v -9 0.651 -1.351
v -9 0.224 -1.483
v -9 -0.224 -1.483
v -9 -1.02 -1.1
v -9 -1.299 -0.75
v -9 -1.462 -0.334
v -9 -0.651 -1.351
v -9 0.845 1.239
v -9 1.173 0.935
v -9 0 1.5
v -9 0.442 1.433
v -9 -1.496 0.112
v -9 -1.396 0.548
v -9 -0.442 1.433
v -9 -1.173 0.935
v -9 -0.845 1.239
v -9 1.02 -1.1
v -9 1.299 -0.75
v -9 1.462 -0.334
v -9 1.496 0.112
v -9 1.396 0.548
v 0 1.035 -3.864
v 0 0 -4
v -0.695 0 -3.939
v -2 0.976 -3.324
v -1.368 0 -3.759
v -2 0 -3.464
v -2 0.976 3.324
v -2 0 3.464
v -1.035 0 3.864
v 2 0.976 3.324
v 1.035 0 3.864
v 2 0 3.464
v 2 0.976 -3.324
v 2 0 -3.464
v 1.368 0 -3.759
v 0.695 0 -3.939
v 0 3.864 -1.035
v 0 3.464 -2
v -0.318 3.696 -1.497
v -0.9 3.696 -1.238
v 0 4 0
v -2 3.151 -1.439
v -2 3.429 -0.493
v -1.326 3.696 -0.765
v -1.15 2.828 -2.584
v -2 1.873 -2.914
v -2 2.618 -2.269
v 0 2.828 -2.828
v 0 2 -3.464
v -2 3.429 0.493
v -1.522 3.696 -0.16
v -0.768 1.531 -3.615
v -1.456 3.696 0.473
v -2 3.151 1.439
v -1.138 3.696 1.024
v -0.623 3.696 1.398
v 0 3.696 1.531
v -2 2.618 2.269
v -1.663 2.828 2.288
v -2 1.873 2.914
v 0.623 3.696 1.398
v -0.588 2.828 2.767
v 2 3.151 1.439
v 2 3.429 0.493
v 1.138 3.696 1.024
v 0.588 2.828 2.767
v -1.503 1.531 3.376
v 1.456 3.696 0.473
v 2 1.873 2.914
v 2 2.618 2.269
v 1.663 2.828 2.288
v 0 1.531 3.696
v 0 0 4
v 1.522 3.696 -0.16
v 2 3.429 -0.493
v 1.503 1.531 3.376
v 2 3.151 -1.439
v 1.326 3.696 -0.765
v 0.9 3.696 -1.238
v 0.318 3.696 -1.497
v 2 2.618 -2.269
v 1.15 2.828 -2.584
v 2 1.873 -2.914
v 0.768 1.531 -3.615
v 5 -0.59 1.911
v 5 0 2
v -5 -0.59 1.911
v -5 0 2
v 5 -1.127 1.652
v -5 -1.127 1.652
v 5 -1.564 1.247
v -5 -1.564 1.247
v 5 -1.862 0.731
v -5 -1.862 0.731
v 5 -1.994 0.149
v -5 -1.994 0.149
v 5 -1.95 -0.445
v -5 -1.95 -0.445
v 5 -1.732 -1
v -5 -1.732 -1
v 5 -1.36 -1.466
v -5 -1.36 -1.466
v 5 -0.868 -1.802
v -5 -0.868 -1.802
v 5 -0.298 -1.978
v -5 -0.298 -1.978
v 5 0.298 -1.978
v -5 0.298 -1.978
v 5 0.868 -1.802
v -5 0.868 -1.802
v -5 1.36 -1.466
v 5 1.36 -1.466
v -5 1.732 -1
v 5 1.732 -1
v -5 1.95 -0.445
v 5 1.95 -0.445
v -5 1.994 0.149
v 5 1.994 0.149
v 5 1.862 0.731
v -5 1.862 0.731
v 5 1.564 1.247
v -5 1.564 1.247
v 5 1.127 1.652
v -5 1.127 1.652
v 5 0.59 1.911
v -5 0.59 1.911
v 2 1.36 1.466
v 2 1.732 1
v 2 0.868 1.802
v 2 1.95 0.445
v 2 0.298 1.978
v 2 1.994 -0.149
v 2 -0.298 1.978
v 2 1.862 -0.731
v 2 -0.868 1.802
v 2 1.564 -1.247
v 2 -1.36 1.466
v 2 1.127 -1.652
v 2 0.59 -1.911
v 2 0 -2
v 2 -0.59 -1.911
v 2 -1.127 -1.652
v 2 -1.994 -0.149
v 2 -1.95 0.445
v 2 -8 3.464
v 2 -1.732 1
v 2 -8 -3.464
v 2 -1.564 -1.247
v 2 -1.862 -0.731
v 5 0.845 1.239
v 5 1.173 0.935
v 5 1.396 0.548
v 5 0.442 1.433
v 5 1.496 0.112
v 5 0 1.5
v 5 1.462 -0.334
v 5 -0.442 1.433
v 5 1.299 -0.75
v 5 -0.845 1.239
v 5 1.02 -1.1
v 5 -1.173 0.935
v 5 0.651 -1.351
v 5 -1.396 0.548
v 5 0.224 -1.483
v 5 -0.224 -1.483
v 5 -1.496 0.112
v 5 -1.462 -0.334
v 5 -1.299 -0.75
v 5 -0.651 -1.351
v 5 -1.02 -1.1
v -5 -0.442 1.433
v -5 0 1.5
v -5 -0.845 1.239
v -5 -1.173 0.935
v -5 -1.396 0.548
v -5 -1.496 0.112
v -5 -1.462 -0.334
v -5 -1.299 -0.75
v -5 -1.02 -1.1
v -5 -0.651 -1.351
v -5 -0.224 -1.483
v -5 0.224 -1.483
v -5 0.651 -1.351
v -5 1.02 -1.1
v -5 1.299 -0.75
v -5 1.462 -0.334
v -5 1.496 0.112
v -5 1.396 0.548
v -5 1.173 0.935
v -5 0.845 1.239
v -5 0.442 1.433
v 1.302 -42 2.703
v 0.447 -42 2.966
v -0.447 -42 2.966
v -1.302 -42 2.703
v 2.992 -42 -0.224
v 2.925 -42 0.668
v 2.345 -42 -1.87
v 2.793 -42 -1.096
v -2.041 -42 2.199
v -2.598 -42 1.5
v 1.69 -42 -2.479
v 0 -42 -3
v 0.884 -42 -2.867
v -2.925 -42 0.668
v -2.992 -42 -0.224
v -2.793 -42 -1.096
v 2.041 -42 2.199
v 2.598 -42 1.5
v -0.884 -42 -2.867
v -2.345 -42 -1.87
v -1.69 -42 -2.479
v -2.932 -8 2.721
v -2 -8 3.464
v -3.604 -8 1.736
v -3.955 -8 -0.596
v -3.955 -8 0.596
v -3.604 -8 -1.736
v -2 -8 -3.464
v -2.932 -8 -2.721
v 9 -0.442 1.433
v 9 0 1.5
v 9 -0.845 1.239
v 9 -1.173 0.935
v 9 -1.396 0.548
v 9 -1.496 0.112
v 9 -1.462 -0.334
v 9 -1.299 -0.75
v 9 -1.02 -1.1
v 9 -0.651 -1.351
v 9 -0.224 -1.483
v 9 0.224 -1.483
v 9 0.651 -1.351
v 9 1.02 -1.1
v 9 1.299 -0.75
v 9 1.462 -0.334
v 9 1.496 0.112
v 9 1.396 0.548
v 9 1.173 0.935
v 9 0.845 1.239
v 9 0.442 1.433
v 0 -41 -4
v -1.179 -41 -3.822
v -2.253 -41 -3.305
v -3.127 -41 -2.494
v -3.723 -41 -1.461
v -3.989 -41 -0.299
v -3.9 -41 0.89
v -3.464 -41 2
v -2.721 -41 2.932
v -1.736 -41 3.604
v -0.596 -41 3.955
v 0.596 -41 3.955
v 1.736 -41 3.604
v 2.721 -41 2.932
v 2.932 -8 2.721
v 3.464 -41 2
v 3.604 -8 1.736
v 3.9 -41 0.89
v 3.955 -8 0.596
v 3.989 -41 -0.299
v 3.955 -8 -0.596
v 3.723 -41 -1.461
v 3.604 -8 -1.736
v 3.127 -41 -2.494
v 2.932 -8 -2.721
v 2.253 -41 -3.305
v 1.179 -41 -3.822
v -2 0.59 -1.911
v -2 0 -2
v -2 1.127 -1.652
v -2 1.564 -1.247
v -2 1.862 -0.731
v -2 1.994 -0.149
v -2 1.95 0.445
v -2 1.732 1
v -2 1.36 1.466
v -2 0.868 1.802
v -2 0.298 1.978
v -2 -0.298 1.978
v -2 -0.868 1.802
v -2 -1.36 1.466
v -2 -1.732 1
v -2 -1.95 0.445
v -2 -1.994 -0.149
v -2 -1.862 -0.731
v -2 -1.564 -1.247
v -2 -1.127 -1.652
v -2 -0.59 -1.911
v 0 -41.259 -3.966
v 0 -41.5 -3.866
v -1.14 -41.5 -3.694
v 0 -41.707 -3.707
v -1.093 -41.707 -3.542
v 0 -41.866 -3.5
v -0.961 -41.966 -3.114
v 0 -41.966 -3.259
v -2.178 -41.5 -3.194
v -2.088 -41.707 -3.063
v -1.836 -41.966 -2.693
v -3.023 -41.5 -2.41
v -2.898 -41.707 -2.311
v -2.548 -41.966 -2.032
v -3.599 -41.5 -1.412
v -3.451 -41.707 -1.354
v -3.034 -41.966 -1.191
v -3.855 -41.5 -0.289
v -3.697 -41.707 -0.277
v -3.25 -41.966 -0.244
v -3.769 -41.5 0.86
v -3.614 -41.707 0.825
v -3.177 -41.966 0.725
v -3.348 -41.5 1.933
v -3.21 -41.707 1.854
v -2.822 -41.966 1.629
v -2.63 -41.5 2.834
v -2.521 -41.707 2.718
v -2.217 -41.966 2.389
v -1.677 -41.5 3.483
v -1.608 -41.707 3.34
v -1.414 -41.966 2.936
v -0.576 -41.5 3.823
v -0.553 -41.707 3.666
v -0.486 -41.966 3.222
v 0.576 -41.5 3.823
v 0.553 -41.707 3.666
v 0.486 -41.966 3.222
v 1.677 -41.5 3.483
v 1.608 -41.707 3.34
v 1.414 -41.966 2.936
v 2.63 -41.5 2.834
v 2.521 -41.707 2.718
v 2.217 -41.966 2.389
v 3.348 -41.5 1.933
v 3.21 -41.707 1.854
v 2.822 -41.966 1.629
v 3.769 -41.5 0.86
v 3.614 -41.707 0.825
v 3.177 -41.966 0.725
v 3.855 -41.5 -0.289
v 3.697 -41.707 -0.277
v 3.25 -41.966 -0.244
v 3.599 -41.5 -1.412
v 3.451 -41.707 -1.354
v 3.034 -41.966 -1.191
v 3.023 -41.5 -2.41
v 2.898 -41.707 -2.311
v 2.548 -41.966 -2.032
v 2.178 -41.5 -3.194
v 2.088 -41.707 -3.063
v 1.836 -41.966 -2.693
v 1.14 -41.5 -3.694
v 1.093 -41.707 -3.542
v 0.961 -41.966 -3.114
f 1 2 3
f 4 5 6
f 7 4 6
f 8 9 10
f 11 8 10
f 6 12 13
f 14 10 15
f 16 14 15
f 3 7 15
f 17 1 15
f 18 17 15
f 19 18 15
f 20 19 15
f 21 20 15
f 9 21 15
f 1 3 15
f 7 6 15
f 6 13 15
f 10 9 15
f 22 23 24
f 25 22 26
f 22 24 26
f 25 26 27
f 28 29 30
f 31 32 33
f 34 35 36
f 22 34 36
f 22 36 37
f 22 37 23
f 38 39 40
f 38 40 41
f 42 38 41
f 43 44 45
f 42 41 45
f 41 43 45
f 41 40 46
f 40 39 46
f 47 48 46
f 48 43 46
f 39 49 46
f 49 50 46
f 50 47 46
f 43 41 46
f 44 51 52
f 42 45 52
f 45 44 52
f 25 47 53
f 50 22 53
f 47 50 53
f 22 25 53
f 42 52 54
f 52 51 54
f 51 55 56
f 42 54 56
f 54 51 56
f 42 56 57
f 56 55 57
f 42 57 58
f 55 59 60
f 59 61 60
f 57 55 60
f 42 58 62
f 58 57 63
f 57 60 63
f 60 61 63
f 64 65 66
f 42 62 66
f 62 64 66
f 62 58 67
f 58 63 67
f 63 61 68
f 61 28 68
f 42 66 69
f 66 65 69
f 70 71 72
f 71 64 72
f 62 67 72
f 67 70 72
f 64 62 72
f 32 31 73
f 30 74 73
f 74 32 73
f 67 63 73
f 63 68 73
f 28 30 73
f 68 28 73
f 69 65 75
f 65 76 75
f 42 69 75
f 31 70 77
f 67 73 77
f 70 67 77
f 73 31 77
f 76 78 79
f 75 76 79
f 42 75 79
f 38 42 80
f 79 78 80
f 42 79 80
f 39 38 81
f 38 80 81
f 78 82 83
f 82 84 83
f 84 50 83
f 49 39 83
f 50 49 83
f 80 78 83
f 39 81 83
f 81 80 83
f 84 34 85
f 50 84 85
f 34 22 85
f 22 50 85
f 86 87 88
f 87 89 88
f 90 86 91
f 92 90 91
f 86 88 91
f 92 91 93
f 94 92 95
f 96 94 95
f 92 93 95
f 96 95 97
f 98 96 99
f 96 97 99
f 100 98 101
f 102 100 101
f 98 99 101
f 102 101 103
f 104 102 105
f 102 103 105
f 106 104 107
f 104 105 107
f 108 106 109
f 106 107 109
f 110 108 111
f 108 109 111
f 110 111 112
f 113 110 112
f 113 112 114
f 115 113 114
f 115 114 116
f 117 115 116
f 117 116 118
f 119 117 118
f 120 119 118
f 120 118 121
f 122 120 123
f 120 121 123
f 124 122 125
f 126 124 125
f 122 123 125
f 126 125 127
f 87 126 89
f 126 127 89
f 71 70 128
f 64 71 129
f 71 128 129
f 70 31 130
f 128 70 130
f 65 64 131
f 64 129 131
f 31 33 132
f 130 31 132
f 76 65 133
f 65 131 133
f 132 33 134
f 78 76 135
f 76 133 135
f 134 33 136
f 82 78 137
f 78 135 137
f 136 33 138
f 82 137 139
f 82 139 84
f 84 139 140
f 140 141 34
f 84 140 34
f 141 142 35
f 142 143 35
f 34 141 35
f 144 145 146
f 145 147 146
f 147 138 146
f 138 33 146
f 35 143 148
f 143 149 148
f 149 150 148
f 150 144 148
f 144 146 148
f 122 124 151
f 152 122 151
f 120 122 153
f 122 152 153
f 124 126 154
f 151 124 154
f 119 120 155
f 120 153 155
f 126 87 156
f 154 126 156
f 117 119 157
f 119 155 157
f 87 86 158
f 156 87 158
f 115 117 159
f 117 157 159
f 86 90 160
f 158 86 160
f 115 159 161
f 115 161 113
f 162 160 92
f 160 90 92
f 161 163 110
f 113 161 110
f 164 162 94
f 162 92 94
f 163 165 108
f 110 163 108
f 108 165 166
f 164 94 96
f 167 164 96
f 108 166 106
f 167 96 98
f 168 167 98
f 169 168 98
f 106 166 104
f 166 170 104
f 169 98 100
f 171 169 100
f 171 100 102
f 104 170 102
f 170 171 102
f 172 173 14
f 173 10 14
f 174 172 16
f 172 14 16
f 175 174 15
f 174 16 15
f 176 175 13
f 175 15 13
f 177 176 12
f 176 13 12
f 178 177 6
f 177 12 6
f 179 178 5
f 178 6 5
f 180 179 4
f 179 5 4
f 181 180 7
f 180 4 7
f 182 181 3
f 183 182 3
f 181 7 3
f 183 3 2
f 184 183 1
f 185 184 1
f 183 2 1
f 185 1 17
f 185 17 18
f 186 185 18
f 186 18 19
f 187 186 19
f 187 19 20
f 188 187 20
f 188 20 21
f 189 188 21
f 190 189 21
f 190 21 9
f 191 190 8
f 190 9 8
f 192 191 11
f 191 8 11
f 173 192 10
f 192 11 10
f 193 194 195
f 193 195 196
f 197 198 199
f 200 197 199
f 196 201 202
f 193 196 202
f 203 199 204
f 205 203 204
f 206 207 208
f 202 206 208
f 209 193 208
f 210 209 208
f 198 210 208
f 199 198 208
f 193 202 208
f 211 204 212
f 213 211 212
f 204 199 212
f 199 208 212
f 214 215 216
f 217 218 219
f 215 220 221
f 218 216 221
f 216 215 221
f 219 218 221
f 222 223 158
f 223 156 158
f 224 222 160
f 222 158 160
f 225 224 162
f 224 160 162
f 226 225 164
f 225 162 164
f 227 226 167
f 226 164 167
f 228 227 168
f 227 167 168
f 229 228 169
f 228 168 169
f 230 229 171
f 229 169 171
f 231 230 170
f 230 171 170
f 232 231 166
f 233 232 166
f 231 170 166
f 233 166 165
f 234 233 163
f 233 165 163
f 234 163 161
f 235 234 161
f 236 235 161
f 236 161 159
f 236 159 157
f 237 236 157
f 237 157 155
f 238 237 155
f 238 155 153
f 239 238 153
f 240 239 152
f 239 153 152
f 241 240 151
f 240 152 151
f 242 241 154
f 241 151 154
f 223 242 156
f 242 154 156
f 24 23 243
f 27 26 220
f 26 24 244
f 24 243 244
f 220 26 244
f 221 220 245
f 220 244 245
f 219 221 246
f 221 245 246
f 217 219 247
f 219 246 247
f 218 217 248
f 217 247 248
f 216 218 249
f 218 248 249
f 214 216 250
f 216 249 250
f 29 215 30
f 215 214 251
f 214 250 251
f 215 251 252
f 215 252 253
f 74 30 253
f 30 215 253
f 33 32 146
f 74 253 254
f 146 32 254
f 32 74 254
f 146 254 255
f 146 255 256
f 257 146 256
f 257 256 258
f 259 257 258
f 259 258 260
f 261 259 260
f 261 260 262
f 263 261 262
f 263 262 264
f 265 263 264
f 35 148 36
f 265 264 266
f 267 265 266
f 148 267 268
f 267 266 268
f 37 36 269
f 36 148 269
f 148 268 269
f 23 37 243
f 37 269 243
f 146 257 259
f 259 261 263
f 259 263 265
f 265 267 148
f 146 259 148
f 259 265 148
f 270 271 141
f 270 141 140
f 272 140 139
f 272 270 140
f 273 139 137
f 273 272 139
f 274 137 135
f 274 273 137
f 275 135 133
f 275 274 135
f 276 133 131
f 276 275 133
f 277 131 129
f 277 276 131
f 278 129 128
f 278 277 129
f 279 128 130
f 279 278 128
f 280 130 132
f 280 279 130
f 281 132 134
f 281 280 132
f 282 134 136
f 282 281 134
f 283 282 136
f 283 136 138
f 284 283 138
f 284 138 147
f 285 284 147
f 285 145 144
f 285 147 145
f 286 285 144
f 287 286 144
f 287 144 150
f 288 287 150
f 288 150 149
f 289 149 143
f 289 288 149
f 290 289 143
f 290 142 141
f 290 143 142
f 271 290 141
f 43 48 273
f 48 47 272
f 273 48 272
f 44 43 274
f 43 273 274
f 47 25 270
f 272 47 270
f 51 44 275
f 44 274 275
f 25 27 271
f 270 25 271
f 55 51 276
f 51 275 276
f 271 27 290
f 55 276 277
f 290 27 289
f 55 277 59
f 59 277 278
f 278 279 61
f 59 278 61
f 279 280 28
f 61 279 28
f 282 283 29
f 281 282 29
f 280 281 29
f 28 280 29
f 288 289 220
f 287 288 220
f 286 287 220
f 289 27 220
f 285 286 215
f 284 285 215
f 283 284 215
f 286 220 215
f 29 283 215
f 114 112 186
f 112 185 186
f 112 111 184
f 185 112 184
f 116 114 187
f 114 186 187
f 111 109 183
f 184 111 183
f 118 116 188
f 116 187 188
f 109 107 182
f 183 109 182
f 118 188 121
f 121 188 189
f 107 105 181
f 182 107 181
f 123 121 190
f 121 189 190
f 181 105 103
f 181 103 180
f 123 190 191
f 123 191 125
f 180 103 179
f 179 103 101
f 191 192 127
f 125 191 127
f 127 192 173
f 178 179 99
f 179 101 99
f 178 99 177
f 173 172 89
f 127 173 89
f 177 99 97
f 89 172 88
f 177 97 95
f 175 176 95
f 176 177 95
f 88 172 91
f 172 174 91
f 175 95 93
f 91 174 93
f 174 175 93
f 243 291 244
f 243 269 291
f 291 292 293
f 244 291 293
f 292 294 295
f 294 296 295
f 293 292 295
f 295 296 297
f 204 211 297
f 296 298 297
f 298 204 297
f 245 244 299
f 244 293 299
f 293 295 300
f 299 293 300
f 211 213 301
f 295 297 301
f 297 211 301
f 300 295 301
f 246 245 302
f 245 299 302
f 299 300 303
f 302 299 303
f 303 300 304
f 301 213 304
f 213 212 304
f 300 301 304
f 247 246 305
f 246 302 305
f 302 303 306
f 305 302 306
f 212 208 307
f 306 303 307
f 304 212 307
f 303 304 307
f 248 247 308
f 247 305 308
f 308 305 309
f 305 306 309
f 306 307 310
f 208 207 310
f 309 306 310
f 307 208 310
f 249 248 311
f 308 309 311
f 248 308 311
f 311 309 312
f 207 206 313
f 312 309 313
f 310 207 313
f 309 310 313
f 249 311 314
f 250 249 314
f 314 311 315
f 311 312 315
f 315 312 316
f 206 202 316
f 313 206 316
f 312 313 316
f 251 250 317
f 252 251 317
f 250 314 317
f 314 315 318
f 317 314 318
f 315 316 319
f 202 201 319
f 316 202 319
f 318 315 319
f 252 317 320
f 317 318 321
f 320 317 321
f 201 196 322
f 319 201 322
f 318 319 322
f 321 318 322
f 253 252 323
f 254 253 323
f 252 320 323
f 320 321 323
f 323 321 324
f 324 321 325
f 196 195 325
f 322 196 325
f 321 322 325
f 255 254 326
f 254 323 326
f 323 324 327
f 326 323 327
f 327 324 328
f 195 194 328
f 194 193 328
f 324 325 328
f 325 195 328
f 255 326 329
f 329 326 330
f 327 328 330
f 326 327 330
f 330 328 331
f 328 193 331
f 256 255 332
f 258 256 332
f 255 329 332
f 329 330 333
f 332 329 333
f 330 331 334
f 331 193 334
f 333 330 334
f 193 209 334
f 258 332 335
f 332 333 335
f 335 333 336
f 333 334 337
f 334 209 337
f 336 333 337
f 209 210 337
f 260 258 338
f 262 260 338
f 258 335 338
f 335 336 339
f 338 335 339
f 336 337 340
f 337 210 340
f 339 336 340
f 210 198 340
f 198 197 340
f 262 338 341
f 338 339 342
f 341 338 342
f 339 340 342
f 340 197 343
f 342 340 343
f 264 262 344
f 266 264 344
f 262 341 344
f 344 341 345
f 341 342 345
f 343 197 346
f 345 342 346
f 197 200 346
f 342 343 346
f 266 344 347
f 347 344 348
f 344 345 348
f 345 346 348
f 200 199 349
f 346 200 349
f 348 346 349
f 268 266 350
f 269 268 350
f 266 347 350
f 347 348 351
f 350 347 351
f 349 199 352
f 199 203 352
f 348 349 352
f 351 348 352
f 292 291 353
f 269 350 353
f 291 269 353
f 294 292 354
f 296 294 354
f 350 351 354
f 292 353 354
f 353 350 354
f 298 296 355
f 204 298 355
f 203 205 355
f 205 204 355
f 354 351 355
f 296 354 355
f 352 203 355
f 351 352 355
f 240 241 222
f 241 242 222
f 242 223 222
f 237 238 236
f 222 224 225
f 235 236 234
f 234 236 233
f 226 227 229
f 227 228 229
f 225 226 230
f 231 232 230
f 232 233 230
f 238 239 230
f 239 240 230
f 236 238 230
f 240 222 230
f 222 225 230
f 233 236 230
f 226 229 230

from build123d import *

# Parameters (mm, degrees)
CUT_EXTRUDE1_DEPTH      = 43.3792403
CUT_EXTRUDE1_DEPTH_BACK = 43.3792403
SKETCH3_R               = 2
CUT_EXTRUDE3_START      = -8
CUT_EXTRUDE3_DEPTH      = 12


with BuildPart() as part:
    # Sketch2 → Revolve1 (revolve)
    with BuildSketch(Plane.XY, mode=Mode.PRIVATE) as revolve1_sk:
        with BuildLine():
            Line((4, 0), (4, -41))
            ThreePointArc((4, -41), (3.707106781, -41.707106781), (3, -42))
            Line((3, -42), (0, -42))
            Line((0, -42), (0, 4))
            ThreePointArc((0, 4), (2.828427125, 2.828427125), (4, 0))
        make_face()
    revolve(revolve1_sk.sketch.rotate(Axis((0, -42, 0), (0, 1, 0)), 90), axis=Axis((0, -42, 0), (0, 1, 0)))

    # Sketch3 → Cut-Extrude1 (cut, two sides: drawn at the far end of the back side and taken through both)
    with BuildSketch(Plane(origin=(0, 0, 0), x_dir=(0, 0, -1), z_dir=(1, 0, 0)).offset(-CUT_EXTRUDE1_DEPTH_BACK)):
        Circle(SKETCH3_R)
    extrude(amount=CUT_EXTRUDE1_DEPTH + CUT_EXTRUDE1_DEPTH_BACK, mode=Mode.SUBTRACT)

    # Sketch4 → Cut-Extrude3 (cut)
    with BuildSketch(Plane(origin=(0, 0, 0), x_dir=(1, 0, 0), z_dir=(0, 1, 0)).offset(CUT_EXTRUDE3_START)):
        with BuildLine():
            Line((2, -3.464101615), (2, 3.464101615))
            ThreePointArc((2, 3.464101615), (4, 0), (2, -3.464101615))
        make_face()
        with BuildLine():
            Line((-2, 3.464101615), (-2, -3.464101615))
            ThreePointArc((-2, -3.464101615), (-4, 0), (-2, 3.464101615))
        make_face()
    extrude(amount=CUT_EXTRUDE3_DEPTH, mode=Mode.SUBTRACT)


with BuildPart() as body_2:
    # Sketch5 → Revolve2 (revolve)
    with BuildSketch(Plane.XY, mode=Mode.PRIVATE) as revolve2_sk:
        Polygon((-9, 0), (9, 0), (9, 1.5), (5, 1.5), (5, 2), (-5, 2), (-5, 1.5), (-9, 1.5), align=None)
    revolve(revolve2_sk.sketch.rotate(Axis((-9, 0, 0), (1, 0, 0)), 90), axis=Axis((-9, 0, 0), (1, 0, 0)))


solid = Compound([part.part, body_2.part])
